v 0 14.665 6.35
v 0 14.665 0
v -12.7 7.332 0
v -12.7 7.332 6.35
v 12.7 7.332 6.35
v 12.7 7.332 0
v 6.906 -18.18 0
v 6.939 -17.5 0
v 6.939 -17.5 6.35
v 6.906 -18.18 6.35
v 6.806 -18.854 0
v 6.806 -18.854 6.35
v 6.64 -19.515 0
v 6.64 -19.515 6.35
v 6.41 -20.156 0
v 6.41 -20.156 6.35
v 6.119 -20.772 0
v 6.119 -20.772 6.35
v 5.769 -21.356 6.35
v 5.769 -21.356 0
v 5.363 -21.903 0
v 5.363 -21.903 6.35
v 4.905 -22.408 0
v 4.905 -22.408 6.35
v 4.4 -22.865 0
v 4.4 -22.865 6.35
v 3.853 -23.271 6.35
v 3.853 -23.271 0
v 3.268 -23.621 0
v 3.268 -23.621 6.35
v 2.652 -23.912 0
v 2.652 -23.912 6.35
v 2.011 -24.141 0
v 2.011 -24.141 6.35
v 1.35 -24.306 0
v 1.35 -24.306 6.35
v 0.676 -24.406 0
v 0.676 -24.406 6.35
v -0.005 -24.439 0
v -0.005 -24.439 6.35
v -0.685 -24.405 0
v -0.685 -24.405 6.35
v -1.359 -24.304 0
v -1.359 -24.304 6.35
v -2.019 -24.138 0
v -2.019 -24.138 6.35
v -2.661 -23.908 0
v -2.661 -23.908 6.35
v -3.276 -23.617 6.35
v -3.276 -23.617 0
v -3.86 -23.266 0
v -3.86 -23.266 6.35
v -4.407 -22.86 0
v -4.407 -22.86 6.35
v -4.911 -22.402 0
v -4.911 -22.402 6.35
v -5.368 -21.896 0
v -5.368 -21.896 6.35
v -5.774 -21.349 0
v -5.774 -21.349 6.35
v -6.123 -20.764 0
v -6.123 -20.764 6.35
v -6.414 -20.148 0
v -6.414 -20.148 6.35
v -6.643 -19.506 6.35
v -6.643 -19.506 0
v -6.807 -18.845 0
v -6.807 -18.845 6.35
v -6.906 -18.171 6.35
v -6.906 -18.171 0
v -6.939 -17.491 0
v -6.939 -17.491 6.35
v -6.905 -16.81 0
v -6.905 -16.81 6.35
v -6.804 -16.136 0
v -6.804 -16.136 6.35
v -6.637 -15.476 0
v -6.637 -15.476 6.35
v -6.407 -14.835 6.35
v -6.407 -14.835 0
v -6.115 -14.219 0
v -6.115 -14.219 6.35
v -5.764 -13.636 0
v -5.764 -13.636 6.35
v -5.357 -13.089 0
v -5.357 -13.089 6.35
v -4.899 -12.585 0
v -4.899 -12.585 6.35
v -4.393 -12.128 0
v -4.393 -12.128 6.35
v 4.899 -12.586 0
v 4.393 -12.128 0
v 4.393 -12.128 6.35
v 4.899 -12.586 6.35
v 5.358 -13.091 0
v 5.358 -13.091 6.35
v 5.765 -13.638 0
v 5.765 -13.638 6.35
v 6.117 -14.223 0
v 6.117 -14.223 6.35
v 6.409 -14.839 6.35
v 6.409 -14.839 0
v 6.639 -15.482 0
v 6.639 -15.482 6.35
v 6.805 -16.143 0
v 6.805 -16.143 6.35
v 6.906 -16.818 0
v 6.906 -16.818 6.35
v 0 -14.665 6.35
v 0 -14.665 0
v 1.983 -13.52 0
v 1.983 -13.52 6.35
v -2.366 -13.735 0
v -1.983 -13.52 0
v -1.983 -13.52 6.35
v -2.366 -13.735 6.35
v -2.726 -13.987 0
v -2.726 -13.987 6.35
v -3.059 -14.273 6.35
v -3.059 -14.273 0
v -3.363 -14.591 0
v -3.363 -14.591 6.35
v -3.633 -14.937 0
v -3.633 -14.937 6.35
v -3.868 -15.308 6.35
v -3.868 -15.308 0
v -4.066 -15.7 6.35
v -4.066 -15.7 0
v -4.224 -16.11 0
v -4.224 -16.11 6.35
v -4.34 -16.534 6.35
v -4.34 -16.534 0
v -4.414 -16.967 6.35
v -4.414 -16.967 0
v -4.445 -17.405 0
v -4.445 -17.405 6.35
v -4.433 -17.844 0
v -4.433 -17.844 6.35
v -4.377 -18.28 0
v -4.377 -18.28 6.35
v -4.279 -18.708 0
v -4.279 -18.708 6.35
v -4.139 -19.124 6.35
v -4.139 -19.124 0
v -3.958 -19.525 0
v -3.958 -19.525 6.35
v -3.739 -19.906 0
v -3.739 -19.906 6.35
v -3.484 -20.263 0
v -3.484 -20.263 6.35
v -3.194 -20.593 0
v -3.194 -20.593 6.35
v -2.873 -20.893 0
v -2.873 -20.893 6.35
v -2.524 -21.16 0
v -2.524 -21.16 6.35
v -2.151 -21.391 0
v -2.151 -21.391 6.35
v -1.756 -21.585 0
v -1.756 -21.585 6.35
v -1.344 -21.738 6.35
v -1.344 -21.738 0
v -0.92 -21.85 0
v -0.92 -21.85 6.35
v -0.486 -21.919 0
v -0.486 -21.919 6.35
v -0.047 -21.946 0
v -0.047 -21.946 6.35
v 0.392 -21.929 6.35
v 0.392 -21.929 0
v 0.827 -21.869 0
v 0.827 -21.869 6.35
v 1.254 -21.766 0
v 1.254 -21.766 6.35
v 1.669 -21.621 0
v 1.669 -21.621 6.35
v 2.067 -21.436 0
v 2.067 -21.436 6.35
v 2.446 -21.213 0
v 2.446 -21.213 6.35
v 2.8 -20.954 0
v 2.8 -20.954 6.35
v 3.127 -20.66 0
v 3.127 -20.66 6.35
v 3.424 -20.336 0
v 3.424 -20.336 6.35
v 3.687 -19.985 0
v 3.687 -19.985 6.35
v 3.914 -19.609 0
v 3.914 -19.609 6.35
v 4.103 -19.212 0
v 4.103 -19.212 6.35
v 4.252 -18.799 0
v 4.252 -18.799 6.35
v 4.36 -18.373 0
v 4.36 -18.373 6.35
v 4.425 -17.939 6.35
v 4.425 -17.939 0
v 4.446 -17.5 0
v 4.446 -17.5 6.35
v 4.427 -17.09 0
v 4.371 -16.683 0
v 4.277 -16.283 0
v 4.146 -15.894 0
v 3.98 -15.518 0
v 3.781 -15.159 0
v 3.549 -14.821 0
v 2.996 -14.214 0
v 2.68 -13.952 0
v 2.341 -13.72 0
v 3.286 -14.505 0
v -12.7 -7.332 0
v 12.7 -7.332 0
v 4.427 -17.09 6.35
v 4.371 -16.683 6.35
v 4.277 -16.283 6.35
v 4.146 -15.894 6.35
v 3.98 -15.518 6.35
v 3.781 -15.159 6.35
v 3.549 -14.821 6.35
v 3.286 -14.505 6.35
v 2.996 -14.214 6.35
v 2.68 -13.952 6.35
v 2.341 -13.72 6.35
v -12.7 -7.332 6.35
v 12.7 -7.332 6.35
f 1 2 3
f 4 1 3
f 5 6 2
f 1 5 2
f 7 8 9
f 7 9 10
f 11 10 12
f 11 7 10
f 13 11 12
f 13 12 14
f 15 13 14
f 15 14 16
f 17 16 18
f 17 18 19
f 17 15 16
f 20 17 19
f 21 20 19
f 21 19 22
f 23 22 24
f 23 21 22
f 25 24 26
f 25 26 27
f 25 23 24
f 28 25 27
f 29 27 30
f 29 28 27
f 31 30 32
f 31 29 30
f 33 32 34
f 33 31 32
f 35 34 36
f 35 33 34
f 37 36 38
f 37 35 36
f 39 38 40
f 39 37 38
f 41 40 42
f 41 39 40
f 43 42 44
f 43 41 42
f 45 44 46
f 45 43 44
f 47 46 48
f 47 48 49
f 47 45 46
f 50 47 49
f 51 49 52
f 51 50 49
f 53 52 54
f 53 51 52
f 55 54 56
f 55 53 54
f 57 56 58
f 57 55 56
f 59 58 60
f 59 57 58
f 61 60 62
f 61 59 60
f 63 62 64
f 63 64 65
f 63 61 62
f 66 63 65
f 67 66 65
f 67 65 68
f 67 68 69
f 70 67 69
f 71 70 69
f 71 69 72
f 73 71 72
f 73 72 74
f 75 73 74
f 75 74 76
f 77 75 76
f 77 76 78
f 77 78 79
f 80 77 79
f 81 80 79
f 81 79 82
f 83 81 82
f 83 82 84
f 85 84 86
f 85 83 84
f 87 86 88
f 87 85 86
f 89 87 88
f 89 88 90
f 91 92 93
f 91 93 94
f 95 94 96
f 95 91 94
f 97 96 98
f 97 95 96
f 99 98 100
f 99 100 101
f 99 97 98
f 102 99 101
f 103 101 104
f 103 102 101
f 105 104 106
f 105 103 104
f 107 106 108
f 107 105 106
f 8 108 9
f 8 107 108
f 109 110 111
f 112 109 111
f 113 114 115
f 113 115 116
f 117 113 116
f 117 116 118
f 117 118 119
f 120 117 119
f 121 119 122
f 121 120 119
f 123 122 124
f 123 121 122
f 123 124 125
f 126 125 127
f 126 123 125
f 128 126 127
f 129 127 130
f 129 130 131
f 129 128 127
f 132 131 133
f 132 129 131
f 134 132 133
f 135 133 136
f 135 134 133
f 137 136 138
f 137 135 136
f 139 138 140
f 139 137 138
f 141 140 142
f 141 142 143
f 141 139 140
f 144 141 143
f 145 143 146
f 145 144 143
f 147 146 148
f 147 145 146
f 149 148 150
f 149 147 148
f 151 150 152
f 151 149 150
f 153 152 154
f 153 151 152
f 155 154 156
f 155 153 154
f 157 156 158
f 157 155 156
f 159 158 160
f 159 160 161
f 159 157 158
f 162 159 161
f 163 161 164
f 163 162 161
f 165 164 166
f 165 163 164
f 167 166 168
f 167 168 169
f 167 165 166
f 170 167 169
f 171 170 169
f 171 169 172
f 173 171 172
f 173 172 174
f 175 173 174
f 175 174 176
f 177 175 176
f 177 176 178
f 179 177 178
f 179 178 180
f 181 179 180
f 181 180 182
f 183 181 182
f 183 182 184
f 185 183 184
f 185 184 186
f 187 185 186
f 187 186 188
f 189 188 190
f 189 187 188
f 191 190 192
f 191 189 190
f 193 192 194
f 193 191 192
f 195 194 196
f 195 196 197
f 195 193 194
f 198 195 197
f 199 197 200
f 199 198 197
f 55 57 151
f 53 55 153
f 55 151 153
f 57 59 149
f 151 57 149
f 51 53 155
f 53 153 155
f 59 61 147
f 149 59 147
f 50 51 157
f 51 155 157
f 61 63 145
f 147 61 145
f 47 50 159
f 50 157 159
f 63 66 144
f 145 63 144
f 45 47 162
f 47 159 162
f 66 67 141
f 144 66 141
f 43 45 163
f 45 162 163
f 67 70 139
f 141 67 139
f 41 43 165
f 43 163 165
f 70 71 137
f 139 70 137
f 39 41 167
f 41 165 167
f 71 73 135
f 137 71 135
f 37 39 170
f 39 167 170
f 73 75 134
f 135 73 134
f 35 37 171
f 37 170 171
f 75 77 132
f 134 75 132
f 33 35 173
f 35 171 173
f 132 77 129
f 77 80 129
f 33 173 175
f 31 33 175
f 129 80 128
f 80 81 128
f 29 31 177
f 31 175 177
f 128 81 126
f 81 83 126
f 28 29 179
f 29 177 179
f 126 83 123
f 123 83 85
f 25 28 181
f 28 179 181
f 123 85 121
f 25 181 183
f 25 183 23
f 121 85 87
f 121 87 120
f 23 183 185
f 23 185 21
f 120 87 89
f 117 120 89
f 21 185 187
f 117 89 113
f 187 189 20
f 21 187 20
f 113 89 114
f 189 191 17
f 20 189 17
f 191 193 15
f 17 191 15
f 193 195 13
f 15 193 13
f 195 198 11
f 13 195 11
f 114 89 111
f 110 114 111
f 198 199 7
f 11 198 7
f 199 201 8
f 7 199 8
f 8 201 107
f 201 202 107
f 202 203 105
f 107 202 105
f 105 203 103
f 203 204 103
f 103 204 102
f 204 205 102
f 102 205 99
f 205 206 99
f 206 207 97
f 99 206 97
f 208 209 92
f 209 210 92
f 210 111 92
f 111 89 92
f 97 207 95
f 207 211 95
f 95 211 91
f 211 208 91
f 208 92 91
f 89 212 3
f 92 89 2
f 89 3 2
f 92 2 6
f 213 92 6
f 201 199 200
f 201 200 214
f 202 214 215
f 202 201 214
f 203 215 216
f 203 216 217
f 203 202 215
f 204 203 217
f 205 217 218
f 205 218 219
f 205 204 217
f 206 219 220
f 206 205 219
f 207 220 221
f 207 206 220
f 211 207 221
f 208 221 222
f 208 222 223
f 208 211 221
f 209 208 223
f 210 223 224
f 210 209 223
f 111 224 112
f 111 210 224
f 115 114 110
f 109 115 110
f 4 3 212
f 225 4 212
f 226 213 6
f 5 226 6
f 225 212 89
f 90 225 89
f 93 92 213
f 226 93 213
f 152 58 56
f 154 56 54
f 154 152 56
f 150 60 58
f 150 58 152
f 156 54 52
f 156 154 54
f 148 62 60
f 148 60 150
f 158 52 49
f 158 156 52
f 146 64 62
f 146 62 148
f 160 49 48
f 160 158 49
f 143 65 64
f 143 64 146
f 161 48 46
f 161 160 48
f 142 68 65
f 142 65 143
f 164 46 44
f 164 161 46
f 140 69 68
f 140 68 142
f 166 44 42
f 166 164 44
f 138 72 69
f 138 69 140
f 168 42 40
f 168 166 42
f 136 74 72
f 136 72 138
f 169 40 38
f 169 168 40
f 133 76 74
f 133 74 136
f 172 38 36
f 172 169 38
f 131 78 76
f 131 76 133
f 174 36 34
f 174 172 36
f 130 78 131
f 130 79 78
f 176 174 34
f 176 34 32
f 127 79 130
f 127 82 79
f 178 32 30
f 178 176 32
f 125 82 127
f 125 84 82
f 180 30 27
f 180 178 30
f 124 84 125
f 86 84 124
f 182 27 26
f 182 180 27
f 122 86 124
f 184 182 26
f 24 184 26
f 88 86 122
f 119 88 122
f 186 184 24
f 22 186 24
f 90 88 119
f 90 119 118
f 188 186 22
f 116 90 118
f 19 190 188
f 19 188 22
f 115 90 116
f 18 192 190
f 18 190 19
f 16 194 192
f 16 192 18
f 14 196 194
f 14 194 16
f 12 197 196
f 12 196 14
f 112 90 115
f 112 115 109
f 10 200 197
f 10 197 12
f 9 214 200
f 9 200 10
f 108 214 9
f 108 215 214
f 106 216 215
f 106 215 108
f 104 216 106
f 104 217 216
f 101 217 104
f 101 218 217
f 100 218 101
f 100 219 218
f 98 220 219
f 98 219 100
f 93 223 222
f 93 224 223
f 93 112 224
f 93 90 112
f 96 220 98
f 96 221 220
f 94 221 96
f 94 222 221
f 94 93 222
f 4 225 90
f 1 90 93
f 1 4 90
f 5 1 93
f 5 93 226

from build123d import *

# Parameters (mm, degrees)
F1_DEPTH = 6.35
F4_DEPTH = 6.35


with BuildPart() as f1:
    # F0 (on Top) → F1 (new body)
    with BuildSketch(Plane.XY):
        Polygon((12.7, -7.3323484187), (12.7, 7.3323484187), (0, 14.6646968374), (-12.7, 7.3323484187), (-12.7, -7.3323484187), (0, -14.6646968374), align=None)
    extrude(amount=F1_DEPTH)

    # F3 (on face) → F4 (join, through all)
    with BuildSketch(Plane(origin=(0, 0, 0), x_dir=(1, 0, 0), z_dir=(0, 0, -1))):
        with BuildLine():
            ThreePointArc((4.3930360984, 12.1283762634), (6.2703188288, 14.5276326774), (6.9390436724, 17.4997411668))
            ThreePointArc((6.9390436724, 17.4997411668), (-2.9721084894, 23.7700599956), (-4.3930360984, 12.1283762634))
            Line((-4.3930360984, 12.1283762634), (-1.9827005664, 13.5199841317))
            ThreePointArc((-1.9827005664, 13.5199841317), (-2.3402873387, 21.2802996927), (4.4462981901, 17.4997411668))
            ThreePointArc((4.4462981901, 17.4997411668), (3.7805585258, 15.1594538282), (1.9827005664, 13.5199841317))
            Line((1.9827005664, 13.5199841317), (4.3930360984, 12.1283762634))
        make_face()
    extrude(amount=-F4_DEPTH)


solid = f1.part
